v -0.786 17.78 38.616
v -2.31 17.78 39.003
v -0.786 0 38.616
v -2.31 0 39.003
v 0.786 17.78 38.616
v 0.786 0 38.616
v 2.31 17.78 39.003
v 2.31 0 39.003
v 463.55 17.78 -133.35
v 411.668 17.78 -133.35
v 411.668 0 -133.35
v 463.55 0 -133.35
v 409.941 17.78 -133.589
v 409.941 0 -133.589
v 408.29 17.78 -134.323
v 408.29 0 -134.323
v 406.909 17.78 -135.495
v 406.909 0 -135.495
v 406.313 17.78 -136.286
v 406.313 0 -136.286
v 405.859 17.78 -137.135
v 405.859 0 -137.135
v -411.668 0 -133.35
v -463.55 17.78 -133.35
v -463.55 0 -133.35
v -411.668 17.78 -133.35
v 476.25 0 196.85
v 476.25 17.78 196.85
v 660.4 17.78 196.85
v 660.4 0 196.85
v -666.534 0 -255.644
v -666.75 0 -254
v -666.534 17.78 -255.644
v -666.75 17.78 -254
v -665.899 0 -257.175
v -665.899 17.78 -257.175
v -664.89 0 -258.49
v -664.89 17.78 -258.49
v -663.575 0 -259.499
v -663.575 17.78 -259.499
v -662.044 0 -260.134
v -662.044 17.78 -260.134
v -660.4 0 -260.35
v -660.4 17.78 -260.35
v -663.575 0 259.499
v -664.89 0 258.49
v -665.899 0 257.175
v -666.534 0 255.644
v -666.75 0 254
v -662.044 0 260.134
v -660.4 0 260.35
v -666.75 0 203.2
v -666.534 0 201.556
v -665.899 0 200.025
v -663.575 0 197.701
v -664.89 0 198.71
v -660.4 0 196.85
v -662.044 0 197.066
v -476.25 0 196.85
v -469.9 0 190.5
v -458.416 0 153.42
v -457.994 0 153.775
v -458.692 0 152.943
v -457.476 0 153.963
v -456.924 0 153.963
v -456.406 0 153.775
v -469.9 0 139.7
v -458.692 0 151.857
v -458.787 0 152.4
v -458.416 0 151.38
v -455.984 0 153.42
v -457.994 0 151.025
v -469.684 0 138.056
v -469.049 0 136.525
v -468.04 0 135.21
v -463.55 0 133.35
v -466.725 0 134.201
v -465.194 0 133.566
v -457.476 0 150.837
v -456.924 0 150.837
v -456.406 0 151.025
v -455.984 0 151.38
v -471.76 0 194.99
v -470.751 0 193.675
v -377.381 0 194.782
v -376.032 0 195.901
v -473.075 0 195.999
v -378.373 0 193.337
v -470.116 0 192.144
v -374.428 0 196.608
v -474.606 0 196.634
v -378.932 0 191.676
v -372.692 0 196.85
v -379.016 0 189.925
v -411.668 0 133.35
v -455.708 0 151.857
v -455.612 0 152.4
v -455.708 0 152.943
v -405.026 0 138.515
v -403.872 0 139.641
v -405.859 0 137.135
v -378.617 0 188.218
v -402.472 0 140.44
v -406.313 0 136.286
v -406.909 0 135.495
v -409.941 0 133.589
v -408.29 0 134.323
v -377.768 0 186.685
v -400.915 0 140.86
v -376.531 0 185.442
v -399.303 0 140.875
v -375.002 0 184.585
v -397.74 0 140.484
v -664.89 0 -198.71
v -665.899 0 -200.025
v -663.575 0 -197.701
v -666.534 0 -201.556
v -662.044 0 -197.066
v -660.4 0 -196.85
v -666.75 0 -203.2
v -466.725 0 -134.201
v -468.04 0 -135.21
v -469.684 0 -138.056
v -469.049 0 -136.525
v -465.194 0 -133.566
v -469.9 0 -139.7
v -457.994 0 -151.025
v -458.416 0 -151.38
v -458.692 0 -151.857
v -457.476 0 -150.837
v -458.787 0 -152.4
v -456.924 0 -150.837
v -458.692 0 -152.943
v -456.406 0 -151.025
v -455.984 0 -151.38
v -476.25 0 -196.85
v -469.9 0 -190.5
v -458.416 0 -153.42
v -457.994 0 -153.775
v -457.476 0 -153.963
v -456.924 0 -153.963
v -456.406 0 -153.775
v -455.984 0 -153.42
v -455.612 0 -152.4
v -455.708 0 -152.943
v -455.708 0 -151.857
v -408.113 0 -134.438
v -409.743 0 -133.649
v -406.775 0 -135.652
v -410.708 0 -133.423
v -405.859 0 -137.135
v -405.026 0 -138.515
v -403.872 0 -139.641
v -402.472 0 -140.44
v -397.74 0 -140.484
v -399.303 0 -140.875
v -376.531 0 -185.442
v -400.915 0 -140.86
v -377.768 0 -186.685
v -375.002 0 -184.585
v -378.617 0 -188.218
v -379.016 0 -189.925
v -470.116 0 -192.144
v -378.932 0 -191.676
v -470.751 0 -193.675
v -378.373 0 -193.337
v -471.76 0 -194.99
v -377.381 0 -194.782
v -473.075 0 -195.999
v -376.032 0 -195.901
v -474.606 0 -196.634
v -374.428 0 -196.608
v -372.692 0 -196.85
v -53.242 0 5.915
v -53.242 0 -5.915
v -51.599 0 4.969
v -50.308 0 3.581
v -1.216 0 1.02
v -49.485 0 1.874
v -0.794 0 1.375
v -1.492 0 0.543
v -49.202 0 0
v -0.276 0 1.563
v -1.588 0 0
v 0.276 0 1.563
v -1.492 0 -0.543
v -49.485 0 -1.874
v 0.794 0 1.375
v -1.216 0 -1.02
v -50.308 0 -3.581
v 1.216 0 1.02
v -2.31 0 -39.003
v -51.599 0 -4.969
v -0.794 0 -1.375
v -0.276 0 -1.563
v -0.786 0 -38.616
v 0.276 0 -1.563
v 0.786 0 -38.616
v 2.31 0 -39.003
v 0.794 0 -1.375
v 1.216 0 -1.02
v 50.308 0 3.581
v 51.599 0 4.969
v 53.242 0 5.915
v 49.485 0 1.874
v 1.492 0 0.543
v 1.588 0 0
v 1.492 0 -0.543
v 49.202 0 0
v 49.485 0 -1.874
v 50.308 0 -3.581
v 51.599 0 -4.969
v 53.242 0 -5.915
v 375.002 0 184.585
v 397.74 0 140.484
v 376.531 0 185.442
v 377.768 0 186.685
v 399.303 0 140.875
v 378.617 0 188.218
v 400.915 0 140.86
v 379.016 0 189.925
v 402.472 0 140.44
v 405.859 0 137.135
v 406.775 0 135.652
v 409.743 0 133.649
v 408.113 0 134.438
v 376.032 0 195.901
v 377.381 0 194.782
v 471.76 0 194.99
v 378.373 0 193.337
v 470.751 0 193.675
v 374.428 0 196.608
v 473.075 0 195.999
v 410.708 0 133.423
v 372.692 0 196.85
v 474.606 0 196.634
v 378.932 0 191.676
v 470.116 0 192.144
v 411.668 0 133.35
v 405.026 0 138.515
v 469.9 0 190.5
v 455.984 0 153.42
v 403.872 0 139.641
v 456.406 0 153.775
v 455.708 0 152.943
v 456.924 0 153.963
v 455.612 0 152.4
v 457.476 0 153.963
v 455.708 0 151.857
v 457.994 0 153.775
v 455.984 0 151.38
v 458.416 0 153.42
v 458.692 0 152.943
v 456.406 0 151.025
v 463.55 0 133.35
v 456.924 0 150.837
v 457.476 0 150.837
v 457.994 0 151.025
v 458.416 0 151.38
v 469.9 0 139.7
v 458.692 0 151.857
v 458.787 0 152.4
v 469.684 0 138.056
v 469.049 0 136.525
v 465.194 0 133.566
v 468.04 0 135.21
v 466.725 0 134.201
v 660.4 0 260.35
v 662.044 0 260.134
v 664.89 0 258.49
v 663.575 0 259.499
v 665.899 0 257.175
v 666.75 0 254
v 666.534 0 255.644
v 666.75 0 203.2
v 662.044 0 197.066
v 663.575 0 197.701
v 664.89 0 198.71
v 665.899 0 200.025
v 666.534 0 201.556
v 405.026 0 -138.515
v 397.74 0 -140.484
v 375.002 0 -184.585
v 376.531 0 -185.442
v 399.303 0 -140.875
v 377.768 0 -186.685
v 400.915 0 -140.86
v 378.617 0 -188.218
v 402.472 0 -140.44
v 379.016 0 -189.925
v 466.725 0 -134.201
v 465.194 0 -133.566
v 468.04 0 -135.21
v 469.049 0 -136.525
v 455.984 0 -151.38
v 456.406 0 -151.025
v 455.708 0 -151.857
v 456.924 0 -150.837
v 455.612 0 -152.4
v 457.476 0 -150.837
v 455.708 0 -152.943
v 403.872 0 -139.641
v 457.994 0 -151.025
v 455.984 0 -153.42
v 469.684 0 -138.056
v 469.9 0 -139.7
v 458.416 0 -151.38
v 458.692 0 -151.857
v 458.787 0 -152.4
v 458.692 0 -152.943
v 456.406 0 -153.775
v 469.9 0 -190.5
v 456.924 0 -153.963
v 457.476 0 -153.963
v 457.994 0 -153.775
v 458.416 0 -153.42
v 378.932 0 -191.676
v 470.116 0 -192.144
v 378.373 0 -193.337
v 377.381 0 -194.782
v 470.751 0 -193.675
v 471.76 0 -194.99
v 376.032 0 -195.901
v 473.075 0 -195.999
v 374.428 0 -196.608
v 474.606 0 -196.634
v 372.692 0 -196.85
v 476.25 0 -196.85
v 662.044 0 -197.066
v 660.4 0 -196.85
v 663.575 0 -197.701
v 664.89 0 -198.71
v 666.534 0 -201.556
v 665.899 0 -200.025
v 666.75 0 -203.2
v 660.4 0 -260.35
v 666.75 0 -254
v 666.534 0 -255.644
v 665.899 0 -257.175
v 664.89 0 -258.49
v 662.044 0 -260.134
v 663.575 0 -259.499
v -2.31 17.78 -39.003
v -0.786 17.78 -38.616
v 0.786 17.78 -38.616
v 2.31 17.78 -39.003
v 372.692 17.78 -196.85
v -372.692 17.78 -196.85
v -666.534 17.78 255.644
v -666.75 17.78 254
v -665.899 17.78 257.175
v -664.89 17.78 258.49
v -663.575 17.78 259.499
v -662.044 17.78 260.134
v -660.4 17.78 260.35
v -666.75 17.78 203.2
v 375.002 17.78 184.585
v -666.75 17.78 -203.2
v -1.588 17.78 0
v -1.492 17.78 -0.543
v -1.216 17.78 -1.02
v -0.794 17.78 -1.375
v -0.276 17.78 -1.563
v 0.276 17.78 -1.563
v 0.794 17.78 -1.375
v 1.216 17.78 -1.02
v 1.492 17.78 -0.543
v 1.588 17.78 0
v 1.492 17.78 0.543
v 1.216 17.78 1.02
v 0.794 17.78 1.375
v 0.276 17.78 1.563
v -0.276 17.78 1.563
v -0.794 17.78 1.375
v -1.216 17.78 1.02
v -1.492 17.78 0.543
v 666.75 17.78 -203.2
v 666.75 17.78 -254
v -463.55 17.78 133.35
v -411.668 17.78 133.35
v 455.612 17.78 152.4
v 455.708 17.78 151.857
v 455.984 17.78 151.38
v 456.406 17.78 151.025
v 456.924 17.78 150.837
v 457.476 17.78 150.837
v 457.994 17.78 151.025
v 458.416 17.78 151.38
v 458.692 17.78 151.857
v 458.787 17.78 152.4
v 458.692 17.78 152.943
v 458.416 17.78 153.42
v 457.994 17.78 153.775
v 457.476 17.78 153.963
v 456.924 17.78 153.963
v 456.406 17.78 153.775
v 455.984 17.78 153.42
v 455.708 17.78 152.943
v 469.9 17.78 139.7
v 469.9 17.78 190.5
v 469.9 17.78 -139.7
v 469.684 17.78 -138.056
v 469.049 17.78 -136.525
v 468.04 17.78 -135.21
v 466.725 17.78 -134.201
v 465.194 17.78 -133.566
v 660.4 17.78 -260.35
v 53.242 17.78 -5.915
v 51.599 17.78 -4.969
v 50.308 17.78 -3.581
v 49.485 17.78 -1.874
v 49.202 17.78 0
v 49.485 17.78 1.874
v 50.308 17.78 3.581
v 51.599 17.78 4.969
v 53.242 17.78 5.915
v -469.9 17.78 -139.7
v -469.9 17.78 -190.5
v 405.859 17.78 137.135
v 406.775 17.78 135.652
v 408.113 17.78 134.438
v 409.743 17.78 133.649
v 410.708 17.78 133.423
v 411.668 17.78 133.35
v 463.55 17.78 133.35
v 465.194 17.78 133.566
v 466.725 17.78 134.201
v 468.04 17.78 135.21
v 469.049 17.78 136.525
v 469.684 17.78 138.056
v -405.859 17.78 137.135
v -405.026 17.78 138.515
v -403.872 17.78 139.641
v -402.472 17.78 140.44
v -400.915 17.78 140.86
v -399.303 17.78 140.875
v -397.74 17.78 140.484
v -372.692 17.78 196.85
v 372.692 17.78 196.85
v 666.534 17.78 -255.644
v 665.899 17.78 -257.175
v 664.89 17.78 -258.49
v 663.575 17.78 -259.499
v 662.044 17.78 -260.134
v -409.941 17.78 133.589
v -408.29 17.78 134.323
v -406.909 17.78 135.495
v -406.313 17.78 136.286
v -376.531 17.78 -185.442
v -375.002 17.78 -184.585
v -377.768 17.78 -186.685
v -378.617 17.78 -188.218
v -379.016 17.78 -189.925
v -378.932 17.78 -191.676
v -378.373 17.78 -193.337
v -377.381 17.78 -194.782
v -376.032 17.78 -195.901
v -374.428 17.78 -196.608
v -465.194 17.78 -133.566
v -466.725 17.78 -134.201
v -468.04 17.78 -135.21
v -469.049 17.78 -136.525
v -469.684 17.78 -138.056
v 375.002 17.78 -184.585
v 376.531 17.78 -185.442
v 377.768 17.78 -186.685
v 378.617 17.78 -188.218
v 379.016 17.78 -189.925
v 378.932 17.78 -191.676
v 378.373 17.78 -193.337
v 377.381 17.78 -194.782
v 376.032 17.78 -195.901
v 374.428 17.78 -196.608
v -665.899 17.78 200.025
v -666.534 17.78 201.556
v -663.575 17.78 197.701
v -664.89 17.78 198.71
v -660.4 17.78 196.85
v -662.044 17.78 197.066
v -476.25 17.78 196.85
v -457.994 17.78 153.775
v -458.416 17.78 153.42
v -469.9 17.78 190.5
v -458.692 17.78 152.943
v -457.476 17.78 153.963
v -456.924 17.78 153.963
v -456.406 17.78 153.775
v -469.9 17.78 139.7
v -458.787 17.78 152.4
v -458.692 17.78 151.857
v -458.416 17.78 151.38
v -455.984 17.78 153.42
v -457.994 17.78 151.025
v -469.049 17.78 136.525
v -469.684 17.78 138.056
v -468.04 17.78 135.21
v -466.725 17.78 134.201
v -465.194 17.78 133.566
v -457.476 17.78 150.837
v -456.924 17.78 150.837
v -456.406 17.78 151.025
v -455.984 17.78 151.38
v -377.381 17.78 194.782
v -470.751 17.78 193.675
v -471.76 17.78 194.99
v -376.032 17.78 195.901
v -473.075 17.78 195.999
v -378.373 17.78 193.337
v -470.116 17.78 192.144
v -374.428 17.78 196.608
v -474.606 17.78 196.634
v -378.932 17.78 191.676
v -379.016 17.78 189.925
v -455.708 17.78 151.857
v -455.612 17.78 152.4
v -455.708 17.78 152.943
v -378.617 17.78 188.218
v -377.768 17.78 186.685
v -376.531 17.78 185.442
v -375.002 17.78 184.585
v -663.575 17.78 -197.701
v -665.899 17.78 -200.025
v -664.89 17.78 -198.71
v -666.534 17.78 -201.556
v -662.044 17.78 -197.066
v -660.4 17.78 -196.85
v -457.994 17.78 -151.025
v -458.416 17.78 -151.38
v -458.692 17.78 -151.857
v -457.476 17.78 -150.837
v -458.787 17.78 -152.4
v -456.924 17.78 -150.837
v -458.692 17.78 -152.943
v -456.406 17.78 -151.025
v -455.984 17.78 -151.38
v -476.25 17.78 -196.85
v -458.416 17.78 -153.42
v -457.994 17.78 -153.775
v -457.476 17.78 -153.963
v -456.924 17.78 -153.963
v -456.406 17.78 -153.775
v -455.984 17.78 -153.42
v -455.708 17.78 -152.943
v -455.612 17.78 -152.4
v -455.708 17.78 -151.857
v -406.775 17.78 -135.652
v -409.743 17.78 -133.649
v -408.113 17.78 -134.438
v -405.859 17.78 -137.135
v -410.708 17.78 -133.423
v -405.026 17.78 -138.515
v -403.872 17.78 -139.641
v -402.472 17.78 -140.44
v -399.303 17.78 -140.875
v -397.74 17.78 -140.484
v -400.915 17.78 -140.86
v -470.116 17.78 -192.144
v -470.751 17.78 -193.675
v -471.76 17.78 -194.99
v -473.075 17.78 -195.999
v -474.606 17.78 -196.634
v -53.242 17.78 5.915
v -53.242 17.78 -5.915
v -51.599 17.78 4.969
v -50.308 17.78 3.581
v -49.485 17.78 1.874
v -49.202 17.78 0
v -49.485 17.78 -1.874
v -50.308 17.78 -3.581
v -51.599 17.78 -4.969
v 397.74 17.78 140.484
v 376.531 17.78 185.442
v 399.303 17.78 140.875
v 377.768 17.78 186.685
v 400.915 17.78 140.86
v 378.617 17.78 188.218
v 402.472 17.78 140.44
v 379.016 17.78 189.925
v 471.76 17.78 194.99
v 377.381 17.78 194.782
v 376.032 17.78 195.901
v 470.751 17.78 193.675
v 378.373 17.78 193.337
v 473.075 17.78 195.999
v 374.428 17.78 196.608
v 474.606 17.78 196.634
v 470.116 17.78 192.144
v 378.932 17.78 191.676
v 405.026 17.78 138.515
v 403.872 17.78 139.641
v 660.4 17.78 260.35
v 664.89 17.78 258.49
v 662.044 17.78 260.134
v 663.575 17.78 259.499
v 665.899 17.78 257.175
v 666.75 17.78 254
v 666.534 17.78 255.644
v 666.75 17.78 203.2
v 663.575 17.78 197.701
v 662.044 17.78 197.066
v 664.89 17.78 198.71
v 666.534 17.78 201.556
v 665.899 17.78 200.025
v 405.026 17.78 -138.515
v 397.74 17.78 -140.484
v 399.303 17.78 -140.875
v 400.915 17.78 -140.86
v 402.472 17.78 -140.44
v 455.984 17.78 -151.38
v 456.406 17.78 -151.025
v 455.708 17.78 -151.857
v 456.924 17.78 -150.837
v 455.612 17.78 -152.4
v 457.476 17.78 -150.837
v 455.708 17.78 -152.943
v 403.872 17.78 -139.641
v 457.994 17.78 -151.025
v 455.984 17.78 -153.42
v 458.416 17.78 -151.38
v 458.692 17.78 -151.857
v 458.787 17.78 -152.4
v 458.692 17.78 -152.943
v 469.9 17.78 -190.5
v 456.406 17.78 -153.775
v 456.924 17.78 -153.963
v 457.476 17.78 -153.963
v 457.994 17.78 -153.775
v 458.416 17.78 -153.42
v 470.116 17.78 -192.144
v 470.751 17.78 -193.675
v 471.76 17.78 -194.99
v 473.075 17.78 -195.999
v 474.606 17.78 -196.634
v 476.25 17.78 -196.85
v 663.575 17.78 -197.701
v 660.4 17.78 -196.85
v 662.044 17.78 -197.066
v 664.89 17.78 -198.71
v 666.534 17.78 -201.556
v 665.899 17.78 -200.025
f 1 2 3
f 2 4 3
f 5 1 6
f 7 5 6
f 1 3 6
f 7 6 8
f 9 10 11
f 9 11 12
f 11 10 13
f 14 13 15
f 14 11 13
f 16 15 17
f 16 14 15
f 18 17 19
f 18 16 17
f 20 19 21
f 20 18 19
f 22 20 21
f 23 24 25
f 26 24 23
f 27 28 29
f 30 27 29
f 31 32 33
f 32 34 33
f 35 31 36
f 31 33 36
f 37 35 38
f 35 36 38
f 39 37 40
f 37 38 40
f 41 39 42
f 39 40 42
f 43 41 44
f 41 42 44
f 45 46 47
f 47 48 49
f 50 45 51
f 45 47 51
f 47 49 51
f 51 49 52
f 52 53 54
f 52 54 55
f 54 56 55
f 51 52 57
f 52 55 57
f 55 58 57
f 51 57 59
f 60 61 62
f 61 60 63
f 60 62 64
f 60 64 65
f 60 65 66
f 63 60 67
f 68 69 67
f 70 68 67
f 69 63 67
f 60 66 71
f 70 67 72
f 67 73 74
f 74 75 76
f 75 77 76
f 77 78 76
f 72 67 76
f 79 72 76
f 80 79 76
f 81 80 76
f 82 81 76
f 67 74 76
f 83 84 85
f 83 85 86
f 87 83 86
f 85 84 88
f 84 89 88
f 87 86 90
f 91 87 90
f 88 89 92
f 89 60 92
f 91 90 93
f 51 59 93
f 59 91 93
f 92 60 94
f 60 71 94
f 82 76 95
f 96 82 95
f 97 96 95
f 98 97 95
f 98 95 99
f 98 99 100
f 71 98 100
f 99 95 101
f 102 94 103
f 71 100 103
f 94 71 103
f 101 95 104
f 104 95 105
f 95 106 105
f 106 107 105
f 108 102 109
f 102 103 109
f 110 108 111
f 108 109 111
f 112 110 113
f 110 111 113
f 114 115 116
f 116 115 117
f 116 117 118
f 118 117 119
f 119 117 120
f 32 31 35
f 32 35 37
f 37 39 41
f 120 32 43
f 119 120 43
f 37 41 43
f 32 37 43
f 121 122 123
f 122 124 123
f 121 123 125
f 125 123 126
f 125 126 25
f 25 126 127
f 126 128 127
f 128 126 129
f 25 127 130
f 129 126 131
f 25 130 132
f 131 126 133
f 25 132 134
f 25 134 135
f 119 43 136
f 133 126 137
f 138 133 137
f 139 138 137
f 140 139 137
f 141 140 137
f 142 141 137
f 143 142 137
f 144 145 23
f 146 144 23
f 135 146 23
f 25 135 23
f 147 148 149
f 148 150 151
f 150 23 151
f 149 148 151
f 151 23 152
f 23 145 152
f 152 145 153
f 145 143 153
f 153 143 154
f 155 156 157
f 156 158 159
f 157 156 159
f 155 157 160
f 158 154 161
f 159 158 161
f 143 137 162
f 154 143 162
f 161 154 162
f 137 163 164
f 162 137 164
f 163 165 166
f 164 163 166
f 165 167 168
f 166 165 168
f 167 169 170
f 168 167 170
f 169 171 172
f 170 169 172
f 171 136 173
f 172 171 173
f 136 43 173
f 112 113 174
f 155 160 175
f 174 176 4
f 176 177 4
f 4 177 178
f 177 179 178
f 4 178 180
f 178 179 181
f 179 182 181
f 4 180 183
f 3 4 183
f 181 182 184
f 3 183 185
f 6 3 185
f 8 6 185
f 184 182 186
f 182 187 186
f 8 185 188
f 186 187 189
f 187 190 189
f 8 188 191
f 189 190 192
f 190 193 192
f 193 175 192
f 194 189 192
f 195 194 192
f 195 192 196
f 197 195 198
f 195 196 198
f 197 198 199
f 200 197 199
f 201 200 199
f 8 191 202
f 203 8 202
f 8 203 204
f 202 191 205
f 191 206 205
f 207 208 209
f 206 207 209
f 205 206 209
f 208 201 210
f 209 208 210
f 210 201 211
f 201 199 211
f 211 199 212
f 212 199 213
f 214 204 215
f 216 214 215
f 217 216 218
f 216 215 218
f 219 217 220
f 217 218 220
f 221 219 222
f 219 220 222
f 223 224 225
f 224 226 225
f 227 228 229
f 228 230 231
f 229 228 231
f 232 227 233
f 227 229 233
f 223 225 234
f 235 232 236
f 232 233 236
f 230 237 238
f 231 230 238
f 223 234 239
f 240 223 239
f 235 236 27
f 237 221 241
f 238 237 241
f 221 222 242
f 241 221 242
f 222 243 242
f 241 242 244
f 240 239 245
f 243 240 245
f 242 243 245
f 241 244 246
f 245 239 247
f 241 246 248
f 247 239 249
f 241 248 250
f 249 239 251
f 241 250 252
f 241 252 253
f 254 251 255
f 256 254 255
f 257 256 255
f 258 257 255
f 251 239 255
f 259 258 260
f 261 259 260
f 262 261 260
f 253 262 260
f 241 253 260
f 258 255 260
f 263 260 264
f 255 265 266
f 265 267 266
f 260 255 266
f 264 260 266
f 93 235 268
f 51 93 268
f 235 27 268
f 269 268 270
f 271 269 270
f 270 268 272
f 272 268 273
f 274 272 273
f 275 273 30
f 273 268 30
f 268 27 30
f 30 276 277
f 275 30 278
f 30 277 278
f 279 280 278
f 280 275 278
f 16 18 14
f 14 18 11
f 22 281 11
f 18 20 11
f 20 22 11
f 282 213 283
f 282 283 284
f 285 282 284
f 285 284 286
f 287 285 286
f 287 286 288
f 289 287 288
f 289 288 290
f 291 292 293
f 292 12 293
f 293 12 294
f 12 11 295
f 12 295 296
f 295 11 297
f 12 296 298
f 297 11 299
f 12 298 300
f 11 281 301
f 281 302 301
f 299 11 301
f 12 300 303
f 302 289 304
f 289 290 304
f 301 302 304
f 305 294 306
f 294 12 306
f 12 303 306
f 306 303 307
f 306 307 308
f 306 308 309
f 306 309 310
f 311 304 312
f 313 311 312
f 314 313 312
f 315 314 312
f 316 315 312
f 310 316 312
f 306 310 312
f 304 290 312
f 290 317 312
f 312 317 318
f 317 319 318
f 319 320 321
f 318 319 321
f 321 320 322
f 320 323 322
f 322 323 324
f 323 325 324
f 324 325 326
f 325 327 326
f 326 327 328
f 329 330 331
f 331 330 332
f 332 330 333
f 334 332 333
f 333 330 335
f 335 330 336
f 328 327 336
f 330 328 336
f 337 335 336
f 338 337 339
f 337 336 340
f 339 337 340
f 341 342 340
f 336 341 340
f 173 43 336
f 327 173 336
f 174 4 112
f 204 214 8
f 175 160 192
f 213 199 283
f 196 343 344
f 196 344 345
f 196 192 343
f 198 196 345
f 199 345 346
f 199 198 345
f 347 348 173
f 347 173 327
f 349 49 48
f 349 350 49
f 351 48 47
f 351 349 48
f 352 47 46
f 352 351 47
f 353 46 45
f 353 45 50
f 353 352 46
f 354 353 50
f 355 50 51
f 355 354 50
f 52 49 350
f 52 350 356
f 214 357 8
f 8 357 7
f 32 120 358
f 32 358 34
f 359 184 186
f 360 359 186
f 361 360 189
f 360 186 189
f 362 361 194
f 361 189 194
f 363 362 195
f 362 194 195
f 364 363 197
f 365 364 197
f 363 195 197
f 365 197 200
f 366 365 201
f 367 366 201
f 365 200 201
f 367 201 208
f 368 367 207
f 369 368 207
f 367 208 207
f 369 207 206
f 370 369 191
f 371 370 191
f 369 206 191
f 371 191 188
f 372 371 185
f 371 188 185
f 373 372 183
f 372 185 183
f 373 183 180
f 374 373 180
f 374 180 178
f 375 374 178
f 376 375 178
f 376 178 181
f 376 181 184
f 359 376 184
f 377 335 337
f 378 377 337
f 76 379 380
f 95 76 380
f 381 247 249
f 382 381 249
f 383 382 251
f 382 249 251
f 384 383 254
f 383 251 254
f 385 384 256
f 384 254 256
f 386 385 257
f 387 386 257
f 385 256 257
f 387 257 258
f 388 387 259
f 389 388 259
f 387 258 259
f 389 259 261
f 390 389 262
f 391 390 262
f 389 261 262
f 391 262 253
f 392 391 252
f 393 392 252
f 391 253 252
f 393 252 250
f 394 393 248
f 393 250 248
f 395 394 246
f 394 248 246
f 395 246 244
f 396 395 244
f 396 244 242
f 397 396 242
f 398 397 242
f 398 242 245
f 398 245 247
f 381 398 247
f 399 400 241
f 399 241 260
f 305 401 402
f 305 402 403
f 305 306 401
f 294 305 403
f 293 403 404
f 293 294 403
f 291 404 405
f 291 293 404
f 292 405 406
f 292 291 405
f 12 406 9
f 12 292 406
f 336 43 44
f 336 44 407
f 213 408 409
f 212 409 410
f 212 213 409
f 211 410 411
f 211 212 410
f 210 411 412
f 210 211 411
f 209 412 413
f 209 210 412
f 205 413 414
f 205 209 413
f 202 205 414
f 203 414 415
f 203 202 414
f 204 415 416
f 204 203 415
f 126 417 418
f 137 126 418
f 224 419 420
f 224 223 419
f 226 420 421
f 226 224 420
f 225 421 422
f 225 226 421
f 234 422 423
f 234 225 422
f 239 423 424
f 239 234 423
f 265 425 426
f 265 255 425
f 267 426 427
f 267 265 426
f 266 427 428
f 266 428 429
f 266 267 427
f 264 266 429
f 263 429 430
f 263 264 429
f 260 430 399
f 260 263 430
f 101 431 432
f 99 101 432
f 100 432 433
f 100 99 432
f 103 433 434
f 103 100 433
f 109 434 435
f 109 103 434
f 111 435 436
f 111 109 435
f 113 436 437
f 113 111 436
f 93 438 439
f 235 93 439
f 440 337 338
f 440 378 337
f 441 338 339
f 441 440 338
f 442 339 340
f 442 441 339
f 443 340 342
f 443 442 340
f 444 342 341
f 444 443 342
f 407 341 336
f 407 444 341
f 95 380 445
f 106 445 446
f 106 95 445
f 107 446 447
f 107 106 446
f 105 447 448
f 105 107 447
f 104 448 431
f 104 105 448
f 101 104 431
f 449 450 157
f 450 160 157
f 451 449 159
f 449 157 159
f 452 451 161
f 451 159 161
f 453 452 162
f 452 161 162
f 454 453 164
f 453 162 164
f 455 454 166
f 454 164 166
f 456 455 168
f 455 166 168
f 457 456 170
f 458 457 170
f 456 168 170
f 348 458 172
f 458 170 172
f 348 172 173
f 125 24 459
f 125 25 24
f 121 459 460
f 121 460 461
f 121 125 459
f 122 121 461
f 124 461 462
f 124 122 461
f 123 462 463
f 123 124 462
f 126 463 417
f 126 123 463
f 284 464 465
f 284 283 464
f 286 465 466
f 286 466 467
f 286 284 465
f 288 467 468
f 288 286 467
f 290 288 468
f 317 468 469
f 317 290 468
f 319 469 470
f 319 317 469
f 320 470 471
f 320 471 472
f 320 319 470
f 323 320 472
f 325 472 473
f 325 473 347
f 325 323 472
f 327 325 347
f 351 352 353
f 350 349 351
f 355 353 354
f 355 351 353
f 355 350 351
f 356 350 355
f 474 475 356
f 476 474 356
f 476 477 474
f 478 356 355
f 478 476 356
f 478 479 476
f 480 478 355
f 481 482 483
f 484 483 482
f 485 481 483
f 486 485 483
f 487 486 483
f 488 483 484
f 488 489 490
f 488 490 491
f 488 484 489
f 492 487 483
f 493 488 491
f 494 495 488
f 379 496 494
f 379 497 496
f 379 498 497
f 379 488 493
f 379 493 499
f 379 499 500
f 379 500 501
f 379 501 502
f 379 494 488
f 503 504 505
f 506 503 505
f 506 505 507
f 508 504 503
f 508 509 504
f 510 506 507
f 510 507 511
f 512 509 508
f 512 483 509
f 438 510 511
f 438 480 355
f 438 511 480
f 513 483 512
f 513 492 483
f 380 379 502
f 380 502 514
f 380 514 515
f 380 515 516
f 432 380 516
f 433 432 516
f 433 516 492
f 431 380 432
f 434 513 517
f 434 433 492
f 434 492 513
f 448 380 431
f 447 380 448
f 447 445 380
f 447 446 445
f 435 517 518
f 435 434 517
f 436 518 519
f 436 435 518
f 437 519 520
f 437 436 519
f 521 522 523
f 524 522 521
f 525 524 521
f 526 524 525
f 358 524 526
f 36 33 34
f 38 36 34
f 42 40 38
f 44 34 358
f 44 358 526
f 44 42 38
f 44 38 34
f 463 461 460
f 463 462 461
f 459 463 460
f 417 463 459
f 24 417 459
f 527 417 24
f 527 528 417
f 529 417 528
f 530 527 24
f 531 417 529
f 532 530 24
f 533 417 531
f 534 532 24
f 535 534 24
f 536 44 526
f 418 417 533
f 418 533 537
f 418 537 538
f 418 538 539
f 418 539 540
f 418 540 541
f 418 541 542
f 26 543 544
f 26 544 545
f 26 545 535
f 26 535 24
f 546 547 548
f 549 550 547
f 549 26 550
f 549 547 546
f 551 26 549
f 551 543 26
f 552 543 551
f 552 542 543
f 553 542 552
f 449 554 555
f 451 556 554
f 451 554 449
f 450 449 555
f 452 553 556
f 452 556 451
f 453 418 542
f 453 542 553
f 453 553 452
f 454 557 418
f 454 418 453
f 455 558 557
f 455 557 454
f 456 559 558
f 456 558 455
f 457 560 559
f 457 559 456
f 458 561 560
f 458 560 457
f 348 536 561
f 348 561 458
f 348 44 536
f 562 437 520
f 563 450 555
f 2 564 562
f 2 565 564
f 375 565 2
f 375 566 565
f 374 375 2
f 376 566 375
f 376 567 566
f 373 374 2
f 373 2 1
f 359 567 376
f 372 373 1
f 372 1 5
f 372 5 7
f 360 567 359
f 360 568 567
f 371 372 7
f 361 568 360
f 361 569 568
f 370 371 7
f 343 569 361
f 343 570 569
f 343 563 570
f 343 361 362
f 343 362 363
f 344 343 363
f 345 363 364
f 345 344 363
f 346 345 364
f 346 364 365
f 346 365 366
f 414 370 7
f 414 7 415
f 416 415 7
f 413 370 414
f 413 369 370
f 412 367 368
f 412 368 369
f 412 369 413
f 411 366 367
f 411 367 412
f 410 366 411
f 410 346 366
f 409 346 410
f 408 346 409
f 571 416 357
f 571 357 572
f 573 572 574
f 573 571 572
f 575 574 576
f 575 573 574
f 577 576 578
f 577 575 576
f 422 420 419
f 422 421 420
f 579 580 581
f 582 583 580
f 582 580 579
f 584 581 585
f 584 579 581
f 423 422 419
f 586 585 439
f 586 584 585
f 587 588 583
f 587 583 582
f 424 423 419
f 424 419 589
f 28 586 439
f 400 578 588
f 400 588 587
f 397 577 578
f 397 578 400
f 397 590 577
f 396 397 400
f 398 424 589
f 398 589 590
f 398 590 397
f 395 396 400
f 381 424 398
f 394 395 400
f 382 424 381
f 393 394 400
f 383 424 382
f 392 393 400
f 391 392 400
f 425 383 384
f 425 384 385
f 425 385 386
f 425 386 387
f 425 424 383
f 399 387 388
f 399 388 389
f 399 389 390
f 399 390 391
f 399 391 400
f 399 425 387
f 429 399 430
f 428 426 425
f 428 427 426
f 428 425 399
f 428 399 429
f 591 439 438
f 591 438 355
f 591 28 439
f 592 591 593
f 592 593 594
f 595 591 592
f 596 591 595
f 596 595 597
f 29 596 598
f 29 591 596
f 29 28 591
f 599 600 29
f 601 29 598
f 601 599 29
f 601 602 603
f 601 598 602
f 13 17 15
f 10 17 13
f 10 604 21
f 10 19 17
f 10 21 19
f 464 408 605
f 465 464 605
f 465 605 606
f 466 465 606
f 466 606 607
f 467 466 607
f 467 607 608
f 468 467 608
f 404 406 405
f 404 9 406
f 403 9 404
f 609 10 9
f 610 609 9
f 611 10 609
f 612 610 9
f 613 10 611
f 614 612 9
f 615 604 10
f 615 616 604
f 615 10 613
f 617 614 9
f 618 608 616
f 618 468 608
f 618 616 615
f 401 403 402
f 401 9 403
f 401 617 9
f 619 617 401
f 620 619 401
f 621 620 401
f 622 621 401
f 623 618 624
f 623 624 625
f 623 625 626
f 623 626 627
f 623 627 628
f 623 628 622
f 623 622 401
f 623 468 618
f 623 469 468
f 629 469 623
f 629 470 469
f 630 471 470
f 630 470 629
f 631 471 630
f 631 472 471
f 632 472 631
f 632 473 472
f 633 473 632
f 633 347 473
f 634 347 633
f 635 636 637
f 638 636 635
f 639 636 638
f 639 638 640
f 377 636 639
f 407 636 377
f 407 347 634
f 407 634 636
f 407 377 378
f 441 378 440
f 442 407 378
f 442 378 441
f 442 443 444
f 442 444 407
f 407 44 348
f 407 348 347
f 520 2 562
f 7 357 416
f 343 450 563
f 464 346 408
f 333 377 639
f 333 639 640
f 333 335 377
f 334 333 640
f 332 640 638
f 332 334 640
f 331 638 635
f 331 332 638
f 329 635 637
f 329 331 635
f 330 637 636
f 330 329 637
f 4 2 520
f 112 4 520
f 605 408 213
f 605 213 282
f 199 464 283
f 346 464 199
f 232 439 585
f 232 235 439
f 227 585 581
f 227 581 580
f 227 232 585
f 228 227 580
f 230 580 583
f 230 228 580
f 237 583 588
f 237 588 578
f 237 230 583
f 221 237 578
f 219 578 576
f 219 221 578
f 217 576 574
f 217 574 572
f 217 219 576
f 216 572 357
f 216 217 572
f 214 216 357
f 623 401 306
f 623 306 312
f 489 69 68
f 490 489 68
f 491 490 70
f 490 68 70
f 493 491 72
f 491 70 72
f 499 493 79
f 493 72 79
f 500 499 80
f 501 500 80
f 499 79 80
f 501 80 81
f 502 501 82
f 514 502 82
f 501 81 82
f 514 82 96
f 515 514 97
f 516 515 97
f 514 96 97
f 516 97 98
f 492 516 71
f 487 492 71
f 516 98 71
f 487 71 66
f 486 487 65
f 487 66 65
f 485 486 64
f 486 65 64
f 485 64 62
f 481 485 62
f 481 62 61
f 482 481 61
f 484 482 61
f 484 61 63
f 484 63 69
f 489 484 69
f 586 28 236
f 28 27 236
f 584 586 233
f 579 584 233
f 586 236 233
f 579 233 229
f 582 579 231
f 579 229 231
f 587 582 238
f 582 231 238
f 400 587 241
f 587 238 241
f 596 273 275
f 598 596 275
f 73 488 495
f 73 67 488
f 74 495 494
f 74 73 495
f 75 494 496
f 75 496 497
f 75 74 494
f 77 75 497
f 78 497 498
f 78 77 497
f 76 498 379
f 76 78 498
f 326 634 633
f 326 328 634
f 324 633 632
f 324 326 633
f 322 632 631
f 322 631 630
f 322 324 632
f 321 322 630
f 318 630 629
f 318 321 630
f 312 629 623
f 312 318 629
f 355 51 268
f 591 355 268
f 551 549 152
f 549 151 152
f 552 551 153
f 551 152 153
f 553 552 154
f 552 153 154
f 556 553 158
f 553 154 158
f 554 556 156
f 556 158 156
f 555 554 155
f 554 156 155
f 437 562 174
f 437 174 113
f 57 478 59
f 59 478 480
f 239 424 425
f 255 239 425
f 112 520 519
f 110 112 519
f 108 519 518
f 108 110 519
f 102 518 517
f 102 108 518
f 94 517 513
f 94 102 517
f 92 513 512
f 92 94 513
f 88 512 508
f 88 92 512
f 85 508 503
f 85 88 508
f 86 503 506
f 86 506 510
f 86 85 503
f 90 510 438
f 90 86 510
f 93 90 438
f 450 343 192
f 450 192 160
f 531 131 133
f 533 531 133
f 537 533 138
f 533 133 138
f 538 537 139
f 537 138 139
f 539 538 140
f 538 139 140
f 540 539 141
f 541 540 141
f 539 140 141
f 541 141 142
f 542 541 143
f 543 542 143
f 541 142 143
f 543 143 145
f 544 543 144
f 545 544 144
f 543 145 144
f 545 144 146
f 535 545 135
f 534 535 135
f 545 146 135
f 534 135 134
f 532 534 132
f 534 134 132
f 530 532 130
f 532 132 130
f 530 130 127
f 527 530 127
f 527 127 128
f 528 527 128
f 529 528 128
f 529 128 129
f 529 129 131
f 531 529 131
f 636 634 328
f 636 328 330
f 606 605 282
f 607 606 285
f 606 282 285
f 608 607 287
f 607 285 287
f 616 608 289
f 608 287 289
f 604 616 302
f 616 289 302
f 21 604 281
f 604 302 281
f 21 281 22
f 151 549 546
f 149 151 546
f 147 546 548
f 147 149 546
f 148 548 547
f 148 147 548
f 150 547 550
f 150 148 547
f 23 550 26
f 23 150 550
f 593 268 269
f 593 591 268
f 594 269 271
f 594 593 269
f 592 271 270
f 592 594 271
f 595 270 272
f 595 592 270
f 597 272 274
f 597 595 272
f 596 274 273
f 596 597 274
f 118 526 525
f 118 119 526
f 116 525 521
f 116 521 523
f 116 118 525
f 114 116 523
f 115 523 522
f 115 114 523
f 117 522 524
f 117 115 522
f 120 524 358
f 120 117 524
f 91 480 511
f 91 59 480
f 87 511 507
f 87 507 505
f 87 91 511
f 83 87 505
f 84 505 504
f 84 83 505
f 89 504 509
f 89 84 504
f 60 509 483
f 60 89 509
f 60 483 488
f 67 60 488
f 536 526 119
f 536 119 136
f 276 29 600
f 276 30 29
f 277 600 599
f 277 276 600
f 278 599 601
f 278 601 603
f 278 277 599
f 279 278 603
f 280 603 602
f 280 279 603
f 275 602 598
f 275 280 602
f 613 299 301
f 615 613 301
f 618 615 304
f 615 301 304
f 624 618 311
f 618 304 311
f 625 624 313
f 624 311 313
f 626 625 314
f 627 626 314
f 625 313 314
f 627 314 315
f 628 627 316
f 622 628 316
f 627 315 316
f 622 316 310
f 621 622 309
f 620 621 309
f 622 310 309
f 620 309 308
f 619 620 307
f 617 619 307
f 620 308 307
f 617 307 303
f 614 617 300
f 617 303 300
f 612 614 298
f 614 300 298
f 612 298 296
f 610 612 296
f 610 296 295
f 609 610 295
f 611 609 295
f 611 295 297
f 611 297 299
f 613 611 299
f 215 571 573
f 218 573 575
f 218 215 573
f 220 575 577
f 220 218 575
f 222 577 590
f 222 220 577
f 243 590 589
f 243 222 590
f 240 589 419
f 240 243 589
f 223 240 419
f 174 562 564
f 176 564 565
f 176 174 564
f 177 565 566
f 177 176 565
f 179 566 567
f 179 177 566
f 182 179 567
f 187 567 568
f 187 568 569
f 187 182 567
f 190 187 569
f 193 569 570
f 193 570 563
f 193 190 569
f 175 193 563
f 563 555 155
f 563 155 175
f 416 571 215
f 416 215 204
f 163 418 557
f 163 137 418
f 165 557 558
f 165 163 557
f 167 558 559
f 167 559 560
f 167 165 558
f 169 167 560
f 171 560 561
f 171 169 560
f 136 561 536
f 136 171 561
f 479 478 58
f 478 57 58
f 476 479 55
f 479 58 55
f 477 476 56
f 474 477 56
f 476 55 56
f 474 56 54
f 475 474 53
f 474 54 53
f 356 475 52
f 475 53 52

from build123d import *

# Parameters (mm, degrees)
SKETCH1_W                    = 1333.5
SKETCH1_H                    = 520.7
BOSS_EXTRUDE1_DEPTH          = 17.78
FILLET1_R                    = 6.35
F_1_8_0_125_DIAMETER_HOLE1_D = 3.175
SKETCH5_W                    = 152.4
SKETCH5_H                    = 393.7
CUT_EXTRUDE1_DEPTH           = 18.78
FILLET2_R                    = 6.35
SKETCH6_W                    = 50.8
SKETCH6_H                    = 393.7
SKETCH6_W_2                  = 63.5
SKETCH6_H_2                  = 266.7
CUT_EXTRUDE2_DEPTH           = 18.78
FILLET3_R                    = 6.35


with BuildPart() as part:
    # Sketch1 → Boss-Extrude1 (new body)
    with BuildSketch(Plane(origin=(0, 0, 0), x_dir=(1, 0, 0), z_dir=(0, 1, 0))):
        Rectangle(SKETCH1_W, SKETCH1_H)
    extrude(amount=BOSS_EXTRUDE1_DEPTH)

    # Fillet1
    fillet1_edges = [part.edges().sort_by_distance(p)[0] for p in [
        (666.75, 8.89, 260.35),
        (-666.75, 8.89, 260.35),
        (-666.75, 8.89, -260.35),
        (666.75, 8.89, -260.35),
    ]]
    fillet(fillet1_edges, radius=FILLET1_R)

    # 1/8 (0.125) Diameter Hole1 (through all)
    with Locations(Plane(origin=(0, 17.78, 0), x_dir=(1, 0, 0), z_dir=(0, 1, 0))):
        with Locations((0, 0), (457.2, 152.4), (-457.2, -152.4), (-457.2, 152.4), (457.2, -152.4)):
            Hole(F_1_8_0_125_DIAMETER_HOLE1_D / 2)

    # Sketch5 → Cut-Extrude1 (cut, through all)
    with BuildSketch(Plane(origin=(0, 17.78, 0), x_dir=(1, 0, 0), z_dir=(0, 1, 0))):
        Polygon((-406.4, 196.85), (406.4, 196.85), (0, 38.1), align=None)
        Polygon((0, -38.1), (-406.4, -196.85), (406.4, -196.85), align=None)
        Polygon((406.4, 143.8671875), (406.4, -143.8671875), (38.1, 0), align=None)
        Polygon((-406.4, 143.8671875), (-38.1, 0), (-406.4, -143.8671875), align=None)
        with Locations((546.1, 0)):
            Rectangle(SKETCH5_W, SKETCH5_H)
        with Locations((-546.1, 0)):
            Rectangle(SKETCH5_W, SKETCH5_H)
    extrude(amount=-CUT_EXTRUDE1_DEPTH, mode=Mode.SUBTRACT)

    # Fillet2
    fillet2_edges = [part.edges().sort_by_distance(p)[0] for p in [
        (-406.4, 8.89, 143.8671875),
        (-406.4, 8.89, -143.8671875),
        (-38.1, 8.89, 0),
        (622.3, 8.89, -196.85),
        (622.3, 8.89, 196.85),
        (469.9, 8.89, 196.85),
        (469.9, 8.89, -196.85),
        (0, 8.89, 38.1),
        (406.4, 8.89, 196.85),
        (-406.4, 8.89, 196.85),
        (38.1, 8.89, 0),
        (406.4, 8.89, -143.8671875),
        (406.4, 8.89, 143.8671875),
        (406.4, 8.89, -196.85),
        (0, 8.89, -38.1),
        (-406.4, 8.89, -196.85),
        (-469.9, 8.89, -196.85),
        (-469.9, 8.89, 196.85),
        (-622.3, 8.89, 196.85),
        (-622.3, 8.89, -196.85),
    ]]
    fillet(fillet2_edges, radius=FILLET2_R)

    # Sketch6 → Cut-Extrude2 (cut, through all)
    with BuildSketch(Plane(origin=(0, 17.78, 0), x_dir=(1, 0, 0), z_dir=(0, 1, 0))):
        with Locations((641.35, 0)):
            Rectangle(SKETCH6_W, SKETCH6_H)
        with Locations((-641.35, 0)):
            Rectangle(SKETCH6_W, SKETCH6_H)
        with Locations((-438.15, 0)):
            Rectangle(SKETCH6_W_2, SKETCH6_H_2)
        with Locations((438.15, 0)):
            Rectangle(SKETCH6_W_2, SKETCH6_H_2)
    extrude(amount=-CUT_EXTRUDE2_DEPTH, mode=Mode.SUBTRACT)

    # Fillet3
    fillet3_edges = [part.edges().sort_by_distance(p)[0] for p in [
        (-666.75, 8.89, 196.85),
        (-666.75, 8.89, -196.85),
        (666.75, 8.89, -196.85),
        (666.75, 8.89, 196.85),
        (-406.4, 8.89, 133.35),
        (-406.4, 8.89, -133.35),
        (-469.9, 8.89, 133.35),
        (-469.9, 8.89, -133.35),
        (469.9, 8.89, -133.35),
        (406.4, 8.89, -133.35),
        (469.9, 8.89, 133.35),
        (406.4, 8.89, 133.35),
    ]]
    fillet(fillet3_edges, radius=FILLET3_R)


solid = part.part
